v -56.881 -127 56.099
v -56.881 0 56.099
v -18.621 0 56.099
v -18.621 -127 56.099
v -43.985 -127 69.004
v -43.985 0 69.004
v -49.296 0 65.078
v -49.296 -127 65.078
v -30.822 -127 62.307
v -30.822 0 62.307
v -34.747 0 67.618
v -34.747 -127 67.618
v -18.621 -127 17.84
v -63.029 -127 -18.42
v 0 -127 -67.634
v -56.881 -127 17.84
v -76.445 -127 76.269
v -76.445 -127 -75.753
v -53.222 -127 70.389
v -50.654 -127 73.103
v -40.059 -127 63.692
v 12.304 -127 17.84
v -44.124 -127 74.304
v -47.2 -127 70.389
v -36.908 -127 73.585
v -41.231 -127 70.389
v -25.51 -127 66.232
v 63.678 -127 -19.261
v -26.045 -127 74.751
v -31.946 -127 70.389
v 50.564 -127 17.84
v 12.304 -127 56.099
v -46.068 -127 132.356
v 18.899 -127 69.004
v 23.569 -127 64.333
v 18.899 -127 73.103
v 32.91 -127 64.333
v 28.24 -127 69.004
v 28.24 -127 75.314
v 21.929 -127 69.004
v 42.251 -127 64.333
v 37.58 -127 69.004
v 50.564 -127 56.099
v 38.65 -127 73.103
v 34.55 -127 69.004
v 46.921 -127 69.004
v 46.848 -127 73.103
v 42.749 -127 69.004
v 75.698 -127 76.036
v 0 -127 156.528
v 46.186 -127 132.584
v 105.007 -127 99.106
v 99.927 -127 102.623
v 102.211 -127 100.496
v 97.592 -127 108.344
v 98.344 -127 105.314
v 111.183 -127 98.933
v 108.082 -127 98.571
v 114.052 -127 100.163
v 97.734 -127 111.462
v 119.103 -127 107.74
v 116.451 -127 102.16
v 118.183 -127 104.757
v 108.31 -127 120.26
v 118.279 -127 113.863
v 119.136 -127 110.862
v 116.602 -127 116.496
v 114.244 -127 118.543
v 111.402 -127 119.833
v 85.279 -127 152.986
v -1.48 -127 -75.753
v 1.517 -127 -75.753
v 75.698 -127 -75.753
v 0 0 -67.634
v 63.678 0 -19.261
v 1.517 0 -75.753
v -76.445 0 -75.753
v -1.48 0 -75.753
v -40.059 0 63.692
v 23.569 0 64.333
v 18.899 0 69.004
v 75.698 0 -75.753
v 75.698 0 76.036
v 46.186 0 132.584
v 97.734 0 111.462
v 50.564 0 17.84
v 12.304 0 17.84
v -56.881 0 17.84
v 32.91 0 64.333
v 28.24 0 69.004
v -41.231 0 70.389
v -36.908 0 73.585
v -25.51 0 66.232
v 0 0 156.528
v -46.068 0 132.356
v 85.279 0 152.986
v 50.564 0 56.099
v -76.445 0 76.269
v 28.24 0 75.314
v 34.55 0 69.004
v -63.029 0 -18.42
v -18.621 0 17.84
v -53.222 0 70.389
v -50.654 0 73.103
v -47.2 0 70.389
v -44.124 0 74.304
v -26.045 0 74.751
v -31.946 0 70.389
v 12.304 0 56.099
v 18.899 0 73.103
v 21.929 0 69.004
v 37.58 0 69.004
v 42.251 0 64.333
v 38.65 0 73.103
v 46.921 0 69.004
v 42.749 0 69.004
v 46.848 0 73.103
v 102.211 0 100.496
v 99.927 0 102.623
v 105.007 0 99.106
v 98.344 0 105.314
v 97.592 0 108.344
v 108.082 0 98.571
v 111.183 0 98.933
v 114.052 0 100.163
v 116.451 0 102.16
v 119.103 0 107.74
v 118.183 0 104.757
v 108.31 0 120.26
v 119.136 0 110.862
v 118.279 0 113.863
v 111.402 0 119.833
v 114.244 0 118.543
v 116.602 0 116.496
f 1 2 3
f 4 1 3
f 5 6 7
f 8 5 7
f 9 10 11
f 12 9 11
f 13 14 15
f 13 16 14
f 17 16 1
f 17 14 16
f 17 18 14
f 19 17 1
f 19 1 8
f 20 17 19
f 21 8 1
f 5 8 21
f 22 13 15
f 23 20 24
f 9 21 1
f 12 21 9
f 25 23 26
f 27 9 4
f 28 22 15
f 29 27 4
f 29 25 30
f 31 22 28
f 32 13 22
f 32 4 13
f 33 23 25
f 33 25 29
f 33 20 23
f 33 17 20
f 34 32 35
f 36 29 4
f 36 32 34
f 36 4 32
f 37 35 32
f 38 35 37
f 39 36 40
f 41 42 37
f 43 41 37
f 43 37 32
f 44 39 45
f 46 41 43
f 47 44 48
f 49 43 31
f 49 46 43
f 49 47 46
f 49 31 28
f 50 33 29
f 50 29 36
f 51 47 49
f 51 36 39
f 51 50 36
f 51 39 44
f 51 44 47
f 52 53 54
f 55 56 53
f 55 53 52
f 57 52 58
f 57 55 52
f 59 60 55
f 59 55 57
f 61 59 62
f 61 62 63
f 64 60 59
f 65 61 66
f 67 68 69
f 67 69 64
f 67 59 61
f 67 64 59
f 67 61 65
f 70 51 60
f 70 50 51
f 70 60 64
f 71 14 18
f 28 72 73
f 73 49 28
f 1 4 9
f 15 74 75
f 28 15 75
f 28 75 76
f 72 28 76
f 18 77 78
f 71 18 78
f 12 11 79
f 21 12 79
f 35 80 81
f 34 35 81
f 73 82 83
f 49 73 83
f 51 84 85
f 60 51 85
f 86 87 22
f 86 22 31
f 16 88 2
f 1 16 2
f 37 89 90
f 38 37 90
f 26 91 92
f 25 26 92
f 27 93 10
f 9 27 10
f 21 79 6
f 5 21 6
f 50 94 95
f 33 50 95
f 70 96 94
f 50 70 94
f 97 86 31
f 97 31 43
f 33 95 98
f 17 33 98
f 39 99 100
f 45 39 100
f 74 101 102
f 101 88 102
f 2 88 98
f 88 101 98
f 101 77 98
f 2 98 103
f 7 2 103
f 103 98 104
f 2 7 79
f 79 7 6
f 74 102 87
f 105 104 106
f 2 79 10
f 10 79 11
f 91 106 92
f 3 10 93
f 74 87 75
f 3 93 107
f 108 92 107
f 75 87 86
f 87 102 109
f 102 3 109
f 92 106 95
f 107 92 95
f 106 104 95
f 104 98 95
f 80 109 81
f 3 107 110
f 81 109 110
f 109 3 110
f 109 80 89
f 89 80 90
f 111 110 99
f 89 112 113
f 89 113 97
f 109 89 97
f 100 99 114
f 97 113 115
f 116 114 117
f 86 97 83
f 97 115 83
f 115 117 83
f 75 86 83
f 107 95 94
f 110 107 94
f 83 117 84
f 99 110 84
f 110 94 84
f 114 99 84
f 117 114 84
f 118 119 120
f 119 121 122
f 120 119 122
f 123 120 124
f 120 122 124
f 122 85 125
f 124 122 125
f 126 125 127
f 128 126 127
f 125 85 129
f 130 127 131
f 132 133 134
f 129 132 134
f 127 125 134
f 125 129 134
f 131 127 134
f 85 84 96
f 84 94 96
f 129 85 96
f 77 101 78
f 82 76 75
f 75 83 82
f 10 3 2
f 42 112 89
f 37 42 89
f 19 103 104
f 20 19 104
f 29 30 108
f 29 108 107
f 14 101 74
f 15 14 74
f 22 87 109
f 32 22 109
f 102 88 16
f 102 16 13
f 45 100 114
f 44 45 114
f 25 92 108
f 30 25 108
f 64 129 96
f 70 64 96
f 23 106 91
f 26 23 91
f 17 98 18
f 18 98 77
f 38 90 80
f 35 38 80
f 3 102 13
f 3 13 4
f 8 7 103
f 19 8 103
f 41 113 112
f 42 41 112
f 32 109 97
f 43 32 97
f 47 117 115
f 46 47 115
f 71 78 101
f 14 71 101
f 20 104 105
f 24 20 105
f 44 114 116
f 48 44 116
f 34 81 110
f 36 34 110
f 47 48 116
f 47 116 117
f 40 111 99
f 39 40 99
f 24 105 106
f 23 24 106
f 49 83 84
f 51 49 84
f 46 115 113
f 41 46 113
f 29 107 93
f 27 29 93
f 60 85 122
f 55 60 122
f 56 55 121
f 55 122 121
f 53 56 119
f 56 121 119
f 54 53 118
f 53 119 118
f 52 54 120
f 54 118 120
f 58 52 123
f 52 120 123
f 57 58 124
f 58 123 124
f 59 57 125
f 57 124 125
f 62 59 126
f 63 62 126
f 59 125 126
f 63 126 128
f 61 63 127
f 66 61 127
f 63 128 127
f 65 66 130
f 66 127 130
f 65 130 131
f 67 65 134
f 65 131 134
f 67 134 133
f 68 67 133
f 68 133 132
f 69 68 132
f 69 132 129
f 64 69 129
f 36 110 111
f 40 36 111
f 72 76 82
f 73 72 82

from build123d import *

# Parameters (mm, degrees)
F0_W     = 38.259773
F0_H     = 38.259772
F0_W_2   = 38.259772
F1_DEPTH = 127


with BuildPart() as f1:
    # F0 (on Front) → F1 (new body)
    with BuildSketch(Plane.XZ):
        Polygon((-1.480275, -75.753056), (-63.029461, -18.419569), (0, -67.634352), (63.677665, -19.261191), (1.517248, -75.753056), (75.698244, -75.753056), (75.698244, 76.035975), (-76.445349, 76.268949), (-76.445349, -75.753056), align=None)
        with Locations((-37.750917, 36.969415)):
            Rectangle(F0_W, F0_H, mode=Mode.SUBTRACT)
        with Locations((31.434221, 36.969415)):
            Rectangle(F0_W_2, F0_H, mode=Mode.SUBTRACT)
        Polygon((-49.296099, 65.077743), (-53.221939, 70.389176), (-50.653815, 73.10266), (-47.200143, 70.389176), (-44.124323, 74.304022), (-41.230742, 70.389176), (-36.907537, 73.584587), (-31.946439, 70.389176), (-26.044864, 74.751208), (-25.51012, 66.232399), (-30.821553, 62.306558), (-34.747393, 67.617991), (-40.058826, 63.692151), (-43.984666, 69.003583), align=None, mode=Mode.SUBTRACT)
        Polygon((23.569294, 64.333276), (18.898987, 69.003583), (18.898987, 73.10266), (21.928739, 69.003583), (28.239602, 75.314446), (34.550464, 69.003583), (38.649541, 73.10266), (42.748618, 69.003583), (46.847696, 73.10266), (46.92083, 69.003583), (42.250523, 64.333276), (37.580216, 69.003583), (32.909909, 64.333276), (28.239602, 69.003583), align=None, mode=Mode.SUBTRACT)
        Polygon((-46.067663, 132.356301), (-76.445349, 76.268949), (75.698244, 76.035975), (46.18622, 132.583613), (0, 156.528115), align=None)
        Polygon((0, 156.528115), (46.18622, 132.583613), (85.278795, 152.985897), align=None)
        Polygon((85.278795, 152.985897), (46.18622, 132.583613), (97.734198, 111.462012), align=None)
        Polygon((108.309702, 120.26045), (85.278795, 152.985897), (97.734198, 111.462012), (108.591035, 119.860694), align=None)
        with BuildLine():
            Line((108.591035, 119.860694), (97.734198, 111.462012))
            ThreePointArc((97.734198, 111.462012), (115.323637, 101.074909), (108.309702, 120.26045))
            Line((108.309702, 120.26045), (108.591035, 119.860694))
        make_face()
    extrude(amount=F1_DEPTH)


solid = f1.part
